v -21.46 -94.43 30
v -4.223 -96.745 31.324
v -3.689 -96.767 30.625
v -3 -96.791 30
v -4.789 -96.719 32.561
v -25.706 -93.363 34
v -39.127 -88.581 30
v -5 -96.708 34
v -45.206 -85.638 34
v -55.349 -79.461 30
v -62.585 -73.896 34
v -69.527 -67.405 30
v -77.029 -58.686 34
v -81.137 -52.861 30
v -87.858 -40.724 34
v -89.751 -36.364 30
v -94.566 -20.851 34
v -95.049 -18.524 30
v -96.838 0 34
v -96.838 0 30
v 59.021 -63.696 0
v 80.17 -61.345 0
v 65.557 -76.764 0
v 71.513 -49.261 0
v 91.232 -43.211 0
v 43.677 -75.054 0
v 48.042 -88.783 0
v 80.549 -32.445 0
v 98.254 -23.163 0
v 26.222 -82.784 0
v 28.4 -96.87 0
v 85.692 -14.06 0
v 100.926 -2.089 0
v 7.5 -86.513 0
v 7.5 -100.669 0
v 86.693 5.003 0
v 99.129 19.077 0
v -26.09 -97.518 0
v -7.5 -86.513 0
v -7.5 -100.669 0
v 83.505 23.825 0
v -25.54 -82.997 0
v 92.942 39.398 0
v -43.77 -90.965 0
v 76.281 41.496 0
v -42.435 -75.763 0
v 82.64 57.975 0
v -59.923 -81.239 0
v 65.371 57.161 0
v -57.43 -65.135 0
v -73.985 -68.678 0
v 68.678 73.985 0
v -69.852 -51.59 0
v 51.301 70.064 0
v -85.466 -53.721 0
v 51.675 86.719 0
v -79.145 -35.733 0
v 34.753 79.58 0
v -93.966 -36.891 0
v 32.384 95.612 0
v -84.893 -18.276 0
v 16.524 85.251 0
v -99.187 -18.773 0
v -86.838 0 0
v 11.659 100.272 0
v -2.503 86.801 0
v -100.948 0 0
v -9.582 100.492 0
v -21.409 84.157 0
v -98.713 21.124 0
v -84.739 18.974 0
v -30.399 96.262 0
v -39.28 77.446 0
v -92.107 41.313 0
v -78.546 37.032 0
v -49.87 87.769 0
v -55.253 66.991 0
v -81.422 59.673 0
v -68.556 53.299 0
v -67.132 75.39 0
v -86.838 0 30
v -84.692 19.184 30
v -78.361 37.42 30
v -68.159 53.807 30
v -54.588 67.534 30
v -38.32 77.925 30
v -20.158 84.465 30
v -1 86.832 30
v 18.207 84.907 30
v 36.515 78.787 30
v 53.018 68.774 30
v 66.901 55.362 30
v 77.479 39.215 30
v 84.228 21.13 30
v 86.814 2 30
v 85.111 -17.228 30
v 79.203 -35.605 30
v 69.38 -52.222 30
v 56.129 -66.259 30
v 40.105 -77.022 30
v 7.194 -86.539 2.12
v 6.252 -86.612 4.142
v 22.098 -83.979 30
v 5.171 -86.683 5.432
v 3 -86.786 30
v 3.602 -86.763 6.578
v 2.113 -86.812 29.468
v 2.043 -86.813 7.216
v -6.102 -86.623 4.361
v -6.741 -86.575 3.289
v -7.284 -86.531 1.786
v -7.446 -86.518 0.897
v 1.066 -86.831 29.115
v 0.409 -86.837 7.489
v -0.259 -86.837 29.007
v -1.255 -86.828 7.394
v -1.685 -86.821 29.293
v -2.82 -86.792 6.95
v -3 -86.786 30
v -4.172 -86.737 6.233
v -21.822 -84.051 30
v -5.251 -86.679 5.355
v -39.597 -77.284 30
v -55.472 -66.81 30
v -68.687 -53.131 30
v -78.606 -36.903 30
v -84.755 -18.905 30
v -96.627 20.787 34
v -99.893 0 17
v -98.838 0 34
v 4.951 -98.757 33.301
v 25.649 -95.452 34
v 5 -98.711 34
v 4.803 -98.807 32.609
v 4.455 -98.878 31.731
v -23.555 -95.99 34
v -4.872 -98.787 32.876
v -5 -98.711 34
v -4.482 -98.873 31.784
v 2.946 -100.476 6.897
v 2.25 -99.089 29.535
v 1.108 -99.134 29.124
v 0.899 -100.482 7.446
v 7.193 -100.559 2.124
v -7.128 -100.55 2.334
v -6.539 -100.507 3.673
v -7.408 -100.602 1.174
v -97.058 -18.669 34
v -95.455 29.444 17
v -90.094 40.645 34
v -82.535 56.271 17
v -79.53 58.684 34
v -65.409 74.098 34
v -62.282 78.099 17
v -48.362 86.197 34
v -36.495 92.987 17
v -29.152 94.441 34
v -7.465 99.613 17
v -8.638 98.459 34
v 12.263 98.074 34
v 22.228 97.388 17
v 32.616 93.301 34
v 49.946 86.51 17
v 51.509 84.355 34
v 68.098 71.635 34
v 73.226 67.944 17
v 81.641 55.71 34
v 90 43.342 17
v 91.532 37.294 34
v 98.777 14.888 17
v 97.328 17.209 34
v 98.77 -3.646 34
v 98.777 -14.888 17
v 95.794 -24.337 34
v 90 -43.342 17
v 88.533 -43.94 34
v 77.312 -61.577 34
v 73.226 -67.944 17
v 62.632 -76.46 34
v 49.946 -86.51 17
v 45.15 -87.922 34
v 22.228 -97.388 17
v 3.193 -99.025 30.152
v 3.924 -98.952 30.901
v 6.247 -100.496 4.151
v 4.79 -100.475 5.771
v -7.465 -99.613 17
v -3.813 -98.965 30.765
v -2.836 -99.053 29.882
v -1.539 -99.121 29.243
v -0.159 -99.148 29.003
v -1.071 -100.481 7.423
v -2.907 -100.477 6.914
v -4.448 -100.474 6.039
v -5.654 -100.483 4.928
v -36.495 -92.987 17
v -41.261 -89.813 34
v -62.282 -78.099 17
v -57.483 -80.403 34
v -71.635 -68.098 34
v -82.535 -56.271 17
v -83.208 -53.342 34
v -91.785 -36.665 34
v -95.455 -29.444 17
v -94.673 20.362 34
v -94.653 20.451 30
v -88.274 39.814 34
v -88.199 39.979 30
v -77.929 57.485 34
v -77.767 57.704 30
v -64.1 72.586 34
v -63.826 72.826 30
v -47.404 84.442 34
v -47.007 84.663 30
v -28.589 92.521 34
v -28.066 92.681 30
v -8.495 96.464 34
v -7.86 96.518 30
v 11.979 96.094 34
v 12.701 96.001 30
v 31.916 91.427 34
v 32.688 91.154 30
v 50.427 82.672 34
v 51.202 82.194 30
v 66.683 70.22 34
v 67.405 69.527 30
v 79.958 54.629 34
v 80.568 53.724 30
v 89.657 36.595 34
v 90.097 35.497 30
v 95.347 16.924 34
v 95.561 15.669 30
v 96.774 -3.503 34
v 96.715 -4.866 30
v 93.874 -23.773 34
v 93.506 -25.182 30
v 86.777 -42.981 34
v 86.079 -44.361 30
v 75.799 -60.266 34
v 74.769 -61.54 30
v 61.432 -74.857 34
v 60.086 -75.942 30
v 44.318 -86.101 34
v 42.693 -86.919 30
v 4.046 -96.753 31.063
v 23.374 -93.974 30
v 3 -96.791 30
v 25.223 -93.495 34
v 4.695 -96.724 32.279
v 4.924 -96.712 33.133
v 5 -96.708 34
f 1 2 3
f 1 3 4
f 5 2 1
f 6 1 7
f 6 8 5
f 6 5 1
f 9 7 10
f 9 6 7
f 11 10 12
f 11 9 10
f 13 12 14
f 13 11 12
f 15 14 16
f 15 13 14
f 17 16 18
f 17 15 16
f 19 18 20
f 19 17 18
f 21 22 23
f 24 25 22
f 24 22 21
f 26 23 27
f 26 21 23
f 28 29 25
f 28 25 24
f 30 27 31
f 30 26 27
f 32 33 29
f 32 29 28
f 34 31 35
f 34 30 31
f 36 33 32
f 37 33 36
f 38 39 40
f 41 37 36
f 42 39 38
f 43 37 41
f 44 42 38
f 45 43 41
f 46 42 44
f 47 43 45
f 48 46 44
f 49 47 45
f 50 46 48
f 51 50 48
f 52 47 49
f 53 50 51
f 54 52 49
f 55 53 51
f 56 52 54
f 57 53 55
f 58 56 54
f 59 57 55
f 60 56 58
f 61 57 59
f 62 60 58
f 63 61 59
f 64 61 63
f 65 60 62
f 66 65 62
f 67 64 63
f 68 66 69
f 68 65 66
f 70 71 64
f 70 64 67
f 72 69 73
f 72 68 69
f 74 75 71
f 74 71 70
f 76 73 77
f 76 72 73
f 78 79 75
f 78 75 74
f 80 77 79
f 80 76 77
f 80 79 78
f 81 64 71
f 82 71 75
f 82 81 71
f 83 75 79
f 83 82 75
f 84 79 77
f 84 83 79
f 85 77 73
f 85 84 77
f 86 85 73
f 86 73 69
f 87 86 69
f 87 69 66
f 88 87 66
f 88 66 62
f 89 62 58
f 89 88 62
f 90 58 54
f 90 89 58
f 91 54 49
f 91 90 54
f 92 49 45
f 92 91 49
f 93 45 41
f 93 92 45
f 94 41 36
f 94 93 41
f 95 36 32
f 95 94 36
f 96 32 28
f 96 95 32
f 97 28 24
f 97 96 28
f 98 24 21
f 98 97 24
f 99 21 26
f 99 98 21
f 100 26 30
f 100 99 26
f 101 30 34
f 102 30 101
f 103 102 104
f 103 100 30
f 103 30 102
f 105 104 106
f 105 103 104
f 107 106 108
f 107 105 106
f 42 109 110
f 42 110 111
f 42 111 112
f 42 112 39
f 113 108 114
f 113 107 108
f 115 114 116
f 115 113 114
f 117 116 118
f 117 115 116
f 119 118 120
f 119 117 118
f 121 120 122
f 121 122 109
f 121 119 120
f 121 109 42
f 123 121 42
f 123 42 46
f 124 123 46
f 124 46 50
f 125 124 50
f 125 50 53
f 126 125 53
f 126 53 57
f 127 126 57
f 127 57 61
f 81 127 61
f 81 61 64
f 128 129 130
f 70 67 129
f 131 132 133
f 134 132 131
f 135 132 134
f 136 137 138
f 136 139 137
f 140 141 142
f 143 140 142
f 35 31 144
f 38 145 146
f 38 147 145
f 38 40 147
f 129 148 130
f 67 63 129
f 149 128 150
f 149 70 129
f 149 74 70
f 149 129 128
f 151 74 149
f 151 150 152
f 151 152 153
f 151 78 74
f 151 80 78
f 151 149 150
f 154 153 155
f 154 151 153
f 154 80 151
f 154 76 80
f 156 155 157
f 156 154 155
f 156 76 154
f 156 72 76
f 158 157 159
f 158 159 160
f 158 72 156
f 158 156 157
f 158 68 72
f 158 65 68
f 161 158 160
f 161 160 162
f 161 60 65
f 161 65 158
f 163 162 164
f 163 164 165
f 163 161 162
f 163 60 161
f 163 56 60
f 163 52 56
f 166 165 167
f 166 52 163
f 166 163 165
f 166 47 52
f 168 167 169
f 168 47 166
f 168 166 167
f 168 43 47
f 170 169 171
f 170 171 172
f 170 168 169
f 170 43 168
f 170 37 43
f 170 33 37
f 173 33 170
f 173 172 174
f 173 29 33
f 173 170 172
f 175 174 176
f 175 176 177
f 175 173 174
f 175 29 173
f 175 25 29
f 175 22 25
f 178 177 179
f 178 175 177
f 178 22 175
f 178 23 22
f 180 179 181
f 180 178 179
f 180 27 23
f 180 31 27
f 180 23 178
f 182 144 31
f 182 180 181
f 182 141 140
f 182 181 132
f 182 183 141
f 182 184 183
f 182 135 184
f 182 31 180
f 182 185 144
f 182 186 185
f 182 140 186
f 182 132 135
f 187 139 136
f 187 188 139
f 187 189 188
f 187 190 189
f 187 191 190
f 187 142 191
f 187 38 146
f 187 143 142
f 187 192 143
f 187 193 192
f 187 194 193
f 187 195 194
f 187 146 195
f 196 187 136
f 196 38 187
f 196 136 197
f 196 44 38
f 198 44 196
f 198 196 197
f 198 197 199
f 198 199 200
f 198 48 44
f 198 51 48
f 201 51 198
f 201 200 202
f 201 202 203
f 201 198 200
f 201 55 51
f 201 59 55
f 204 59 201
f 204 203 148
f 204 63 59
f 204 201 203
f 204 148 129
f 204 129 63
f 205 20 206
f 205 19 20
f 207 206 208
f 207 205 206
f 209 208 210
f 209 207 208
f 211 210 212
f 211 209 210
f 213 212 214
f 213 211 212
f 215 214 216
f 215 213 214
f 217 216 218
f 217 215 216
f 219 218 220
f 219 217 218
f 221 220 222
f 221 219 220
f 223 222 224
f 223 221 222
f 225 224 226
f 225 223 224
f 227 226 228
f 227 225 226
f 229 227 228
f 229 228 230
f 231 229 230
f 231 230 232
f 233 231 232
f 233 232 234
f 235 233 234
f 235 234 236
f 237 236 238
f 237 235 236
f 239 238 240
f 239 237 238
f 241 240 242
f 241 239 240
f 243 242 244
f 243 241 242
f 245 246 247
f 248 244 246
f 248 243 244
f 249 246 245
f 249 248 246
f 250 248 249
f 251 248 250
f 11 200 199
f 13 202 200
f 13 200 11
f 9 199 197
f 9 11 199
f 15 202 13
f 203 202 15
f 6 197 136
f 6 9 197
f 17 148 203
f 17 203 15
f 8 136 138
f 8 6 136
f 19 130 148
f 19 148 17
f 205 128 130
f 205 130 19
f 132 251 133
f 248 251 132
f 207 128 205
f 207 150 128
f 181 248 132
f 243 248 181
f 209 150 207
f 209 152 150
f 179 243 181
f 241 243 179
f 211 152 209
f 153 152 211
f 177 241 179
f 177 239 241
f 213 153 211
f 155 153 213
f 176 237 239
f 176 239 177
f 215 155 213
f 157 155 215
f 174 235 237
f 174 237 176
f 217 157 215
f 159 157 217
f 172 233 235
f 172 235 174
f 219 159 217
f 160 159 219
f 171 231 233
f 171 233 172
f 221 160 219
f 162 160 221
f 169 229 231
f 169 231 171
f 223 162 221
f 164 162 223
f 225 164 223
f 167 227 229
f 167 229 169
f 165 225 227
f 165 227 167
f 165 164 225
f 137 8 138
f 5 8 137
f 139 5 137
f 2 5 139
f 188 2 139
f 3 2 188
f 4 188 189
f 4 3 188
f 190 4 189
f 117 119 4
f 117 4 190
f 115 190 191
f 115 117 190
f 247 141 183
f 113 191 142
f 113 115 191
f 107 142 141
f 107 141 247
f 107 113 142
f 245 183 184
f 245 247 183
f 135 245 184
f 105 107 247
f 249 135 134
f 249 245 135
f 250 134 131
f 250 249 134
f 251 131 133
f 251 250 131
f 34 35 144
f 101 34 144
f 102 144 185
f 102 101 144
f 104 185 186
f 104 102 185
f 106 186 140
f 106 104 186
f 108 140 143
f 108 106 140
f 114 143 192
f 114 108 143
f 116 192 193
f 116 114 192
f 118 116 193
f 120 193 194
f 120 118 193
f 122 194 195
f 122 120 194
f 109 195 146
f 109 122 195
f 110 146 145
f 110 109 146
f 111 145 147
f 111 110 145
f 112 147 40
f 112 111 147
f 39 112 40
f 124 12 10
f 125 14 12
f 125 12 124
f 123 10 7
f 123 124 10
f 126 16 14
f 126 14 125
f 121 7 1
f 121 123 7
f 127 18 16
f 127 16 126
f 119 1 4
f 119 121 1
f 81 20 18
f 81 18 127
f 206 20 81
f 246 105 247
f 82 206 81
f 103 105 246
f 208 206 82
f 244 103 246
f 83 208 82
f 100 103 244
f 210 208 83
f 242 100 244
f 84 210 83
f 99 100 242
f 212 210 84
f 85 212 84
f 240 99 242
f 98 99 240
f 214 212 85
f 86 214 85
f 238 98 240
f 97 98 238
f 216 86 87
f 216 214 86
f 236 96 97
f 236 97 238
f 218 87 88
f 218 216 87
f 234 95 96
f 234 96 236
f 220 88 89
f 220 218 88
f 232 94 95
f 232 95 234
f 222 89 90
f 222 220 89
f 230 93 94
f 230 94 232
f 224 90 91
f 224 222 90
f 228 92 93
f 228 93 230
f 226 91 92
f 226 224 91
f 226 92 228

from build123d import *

# Parameters (mm, degrees)
F4_DEPTH = 122.3


with BuildPart() as f1:
    # F0 (on Front) → F1 (revolve)
    with BuildSketch(Plane.XZ):
        Polygon((-86.8375, 30), (-96.8375, 30), (-96.8375, 34), (-98.8375, 34), (-100.947656, 0), (-96.8375, 0), (-86.8375, 0), align=None)
    revolve(axis=Axis((0, 0, -4.859696), (0, 0, -1)))

    # F2 (on Front) + F3 (on Front) → F4 (cut)
    with BuildSketch(Plane.XZ):
        with BuildLine():
            Line((5, 34), (-5, 34))
            ThreePointArc((-5, 34), (0, 29), (5, 34))
        make_face()
    with BuildSketch(Plane.XZ):
        with BuildLine():
            Line((0, 0), (7.5, 0))
            ThreePointArc((7.5, 0), (0, 7.5), (-7.5, 0))
            Line((-7.5, 0), (0, 0))
        make_face()
    extrude(amount=F4_DEPTH, mode=Mode.SUBTRACT)


solid = f1.part
